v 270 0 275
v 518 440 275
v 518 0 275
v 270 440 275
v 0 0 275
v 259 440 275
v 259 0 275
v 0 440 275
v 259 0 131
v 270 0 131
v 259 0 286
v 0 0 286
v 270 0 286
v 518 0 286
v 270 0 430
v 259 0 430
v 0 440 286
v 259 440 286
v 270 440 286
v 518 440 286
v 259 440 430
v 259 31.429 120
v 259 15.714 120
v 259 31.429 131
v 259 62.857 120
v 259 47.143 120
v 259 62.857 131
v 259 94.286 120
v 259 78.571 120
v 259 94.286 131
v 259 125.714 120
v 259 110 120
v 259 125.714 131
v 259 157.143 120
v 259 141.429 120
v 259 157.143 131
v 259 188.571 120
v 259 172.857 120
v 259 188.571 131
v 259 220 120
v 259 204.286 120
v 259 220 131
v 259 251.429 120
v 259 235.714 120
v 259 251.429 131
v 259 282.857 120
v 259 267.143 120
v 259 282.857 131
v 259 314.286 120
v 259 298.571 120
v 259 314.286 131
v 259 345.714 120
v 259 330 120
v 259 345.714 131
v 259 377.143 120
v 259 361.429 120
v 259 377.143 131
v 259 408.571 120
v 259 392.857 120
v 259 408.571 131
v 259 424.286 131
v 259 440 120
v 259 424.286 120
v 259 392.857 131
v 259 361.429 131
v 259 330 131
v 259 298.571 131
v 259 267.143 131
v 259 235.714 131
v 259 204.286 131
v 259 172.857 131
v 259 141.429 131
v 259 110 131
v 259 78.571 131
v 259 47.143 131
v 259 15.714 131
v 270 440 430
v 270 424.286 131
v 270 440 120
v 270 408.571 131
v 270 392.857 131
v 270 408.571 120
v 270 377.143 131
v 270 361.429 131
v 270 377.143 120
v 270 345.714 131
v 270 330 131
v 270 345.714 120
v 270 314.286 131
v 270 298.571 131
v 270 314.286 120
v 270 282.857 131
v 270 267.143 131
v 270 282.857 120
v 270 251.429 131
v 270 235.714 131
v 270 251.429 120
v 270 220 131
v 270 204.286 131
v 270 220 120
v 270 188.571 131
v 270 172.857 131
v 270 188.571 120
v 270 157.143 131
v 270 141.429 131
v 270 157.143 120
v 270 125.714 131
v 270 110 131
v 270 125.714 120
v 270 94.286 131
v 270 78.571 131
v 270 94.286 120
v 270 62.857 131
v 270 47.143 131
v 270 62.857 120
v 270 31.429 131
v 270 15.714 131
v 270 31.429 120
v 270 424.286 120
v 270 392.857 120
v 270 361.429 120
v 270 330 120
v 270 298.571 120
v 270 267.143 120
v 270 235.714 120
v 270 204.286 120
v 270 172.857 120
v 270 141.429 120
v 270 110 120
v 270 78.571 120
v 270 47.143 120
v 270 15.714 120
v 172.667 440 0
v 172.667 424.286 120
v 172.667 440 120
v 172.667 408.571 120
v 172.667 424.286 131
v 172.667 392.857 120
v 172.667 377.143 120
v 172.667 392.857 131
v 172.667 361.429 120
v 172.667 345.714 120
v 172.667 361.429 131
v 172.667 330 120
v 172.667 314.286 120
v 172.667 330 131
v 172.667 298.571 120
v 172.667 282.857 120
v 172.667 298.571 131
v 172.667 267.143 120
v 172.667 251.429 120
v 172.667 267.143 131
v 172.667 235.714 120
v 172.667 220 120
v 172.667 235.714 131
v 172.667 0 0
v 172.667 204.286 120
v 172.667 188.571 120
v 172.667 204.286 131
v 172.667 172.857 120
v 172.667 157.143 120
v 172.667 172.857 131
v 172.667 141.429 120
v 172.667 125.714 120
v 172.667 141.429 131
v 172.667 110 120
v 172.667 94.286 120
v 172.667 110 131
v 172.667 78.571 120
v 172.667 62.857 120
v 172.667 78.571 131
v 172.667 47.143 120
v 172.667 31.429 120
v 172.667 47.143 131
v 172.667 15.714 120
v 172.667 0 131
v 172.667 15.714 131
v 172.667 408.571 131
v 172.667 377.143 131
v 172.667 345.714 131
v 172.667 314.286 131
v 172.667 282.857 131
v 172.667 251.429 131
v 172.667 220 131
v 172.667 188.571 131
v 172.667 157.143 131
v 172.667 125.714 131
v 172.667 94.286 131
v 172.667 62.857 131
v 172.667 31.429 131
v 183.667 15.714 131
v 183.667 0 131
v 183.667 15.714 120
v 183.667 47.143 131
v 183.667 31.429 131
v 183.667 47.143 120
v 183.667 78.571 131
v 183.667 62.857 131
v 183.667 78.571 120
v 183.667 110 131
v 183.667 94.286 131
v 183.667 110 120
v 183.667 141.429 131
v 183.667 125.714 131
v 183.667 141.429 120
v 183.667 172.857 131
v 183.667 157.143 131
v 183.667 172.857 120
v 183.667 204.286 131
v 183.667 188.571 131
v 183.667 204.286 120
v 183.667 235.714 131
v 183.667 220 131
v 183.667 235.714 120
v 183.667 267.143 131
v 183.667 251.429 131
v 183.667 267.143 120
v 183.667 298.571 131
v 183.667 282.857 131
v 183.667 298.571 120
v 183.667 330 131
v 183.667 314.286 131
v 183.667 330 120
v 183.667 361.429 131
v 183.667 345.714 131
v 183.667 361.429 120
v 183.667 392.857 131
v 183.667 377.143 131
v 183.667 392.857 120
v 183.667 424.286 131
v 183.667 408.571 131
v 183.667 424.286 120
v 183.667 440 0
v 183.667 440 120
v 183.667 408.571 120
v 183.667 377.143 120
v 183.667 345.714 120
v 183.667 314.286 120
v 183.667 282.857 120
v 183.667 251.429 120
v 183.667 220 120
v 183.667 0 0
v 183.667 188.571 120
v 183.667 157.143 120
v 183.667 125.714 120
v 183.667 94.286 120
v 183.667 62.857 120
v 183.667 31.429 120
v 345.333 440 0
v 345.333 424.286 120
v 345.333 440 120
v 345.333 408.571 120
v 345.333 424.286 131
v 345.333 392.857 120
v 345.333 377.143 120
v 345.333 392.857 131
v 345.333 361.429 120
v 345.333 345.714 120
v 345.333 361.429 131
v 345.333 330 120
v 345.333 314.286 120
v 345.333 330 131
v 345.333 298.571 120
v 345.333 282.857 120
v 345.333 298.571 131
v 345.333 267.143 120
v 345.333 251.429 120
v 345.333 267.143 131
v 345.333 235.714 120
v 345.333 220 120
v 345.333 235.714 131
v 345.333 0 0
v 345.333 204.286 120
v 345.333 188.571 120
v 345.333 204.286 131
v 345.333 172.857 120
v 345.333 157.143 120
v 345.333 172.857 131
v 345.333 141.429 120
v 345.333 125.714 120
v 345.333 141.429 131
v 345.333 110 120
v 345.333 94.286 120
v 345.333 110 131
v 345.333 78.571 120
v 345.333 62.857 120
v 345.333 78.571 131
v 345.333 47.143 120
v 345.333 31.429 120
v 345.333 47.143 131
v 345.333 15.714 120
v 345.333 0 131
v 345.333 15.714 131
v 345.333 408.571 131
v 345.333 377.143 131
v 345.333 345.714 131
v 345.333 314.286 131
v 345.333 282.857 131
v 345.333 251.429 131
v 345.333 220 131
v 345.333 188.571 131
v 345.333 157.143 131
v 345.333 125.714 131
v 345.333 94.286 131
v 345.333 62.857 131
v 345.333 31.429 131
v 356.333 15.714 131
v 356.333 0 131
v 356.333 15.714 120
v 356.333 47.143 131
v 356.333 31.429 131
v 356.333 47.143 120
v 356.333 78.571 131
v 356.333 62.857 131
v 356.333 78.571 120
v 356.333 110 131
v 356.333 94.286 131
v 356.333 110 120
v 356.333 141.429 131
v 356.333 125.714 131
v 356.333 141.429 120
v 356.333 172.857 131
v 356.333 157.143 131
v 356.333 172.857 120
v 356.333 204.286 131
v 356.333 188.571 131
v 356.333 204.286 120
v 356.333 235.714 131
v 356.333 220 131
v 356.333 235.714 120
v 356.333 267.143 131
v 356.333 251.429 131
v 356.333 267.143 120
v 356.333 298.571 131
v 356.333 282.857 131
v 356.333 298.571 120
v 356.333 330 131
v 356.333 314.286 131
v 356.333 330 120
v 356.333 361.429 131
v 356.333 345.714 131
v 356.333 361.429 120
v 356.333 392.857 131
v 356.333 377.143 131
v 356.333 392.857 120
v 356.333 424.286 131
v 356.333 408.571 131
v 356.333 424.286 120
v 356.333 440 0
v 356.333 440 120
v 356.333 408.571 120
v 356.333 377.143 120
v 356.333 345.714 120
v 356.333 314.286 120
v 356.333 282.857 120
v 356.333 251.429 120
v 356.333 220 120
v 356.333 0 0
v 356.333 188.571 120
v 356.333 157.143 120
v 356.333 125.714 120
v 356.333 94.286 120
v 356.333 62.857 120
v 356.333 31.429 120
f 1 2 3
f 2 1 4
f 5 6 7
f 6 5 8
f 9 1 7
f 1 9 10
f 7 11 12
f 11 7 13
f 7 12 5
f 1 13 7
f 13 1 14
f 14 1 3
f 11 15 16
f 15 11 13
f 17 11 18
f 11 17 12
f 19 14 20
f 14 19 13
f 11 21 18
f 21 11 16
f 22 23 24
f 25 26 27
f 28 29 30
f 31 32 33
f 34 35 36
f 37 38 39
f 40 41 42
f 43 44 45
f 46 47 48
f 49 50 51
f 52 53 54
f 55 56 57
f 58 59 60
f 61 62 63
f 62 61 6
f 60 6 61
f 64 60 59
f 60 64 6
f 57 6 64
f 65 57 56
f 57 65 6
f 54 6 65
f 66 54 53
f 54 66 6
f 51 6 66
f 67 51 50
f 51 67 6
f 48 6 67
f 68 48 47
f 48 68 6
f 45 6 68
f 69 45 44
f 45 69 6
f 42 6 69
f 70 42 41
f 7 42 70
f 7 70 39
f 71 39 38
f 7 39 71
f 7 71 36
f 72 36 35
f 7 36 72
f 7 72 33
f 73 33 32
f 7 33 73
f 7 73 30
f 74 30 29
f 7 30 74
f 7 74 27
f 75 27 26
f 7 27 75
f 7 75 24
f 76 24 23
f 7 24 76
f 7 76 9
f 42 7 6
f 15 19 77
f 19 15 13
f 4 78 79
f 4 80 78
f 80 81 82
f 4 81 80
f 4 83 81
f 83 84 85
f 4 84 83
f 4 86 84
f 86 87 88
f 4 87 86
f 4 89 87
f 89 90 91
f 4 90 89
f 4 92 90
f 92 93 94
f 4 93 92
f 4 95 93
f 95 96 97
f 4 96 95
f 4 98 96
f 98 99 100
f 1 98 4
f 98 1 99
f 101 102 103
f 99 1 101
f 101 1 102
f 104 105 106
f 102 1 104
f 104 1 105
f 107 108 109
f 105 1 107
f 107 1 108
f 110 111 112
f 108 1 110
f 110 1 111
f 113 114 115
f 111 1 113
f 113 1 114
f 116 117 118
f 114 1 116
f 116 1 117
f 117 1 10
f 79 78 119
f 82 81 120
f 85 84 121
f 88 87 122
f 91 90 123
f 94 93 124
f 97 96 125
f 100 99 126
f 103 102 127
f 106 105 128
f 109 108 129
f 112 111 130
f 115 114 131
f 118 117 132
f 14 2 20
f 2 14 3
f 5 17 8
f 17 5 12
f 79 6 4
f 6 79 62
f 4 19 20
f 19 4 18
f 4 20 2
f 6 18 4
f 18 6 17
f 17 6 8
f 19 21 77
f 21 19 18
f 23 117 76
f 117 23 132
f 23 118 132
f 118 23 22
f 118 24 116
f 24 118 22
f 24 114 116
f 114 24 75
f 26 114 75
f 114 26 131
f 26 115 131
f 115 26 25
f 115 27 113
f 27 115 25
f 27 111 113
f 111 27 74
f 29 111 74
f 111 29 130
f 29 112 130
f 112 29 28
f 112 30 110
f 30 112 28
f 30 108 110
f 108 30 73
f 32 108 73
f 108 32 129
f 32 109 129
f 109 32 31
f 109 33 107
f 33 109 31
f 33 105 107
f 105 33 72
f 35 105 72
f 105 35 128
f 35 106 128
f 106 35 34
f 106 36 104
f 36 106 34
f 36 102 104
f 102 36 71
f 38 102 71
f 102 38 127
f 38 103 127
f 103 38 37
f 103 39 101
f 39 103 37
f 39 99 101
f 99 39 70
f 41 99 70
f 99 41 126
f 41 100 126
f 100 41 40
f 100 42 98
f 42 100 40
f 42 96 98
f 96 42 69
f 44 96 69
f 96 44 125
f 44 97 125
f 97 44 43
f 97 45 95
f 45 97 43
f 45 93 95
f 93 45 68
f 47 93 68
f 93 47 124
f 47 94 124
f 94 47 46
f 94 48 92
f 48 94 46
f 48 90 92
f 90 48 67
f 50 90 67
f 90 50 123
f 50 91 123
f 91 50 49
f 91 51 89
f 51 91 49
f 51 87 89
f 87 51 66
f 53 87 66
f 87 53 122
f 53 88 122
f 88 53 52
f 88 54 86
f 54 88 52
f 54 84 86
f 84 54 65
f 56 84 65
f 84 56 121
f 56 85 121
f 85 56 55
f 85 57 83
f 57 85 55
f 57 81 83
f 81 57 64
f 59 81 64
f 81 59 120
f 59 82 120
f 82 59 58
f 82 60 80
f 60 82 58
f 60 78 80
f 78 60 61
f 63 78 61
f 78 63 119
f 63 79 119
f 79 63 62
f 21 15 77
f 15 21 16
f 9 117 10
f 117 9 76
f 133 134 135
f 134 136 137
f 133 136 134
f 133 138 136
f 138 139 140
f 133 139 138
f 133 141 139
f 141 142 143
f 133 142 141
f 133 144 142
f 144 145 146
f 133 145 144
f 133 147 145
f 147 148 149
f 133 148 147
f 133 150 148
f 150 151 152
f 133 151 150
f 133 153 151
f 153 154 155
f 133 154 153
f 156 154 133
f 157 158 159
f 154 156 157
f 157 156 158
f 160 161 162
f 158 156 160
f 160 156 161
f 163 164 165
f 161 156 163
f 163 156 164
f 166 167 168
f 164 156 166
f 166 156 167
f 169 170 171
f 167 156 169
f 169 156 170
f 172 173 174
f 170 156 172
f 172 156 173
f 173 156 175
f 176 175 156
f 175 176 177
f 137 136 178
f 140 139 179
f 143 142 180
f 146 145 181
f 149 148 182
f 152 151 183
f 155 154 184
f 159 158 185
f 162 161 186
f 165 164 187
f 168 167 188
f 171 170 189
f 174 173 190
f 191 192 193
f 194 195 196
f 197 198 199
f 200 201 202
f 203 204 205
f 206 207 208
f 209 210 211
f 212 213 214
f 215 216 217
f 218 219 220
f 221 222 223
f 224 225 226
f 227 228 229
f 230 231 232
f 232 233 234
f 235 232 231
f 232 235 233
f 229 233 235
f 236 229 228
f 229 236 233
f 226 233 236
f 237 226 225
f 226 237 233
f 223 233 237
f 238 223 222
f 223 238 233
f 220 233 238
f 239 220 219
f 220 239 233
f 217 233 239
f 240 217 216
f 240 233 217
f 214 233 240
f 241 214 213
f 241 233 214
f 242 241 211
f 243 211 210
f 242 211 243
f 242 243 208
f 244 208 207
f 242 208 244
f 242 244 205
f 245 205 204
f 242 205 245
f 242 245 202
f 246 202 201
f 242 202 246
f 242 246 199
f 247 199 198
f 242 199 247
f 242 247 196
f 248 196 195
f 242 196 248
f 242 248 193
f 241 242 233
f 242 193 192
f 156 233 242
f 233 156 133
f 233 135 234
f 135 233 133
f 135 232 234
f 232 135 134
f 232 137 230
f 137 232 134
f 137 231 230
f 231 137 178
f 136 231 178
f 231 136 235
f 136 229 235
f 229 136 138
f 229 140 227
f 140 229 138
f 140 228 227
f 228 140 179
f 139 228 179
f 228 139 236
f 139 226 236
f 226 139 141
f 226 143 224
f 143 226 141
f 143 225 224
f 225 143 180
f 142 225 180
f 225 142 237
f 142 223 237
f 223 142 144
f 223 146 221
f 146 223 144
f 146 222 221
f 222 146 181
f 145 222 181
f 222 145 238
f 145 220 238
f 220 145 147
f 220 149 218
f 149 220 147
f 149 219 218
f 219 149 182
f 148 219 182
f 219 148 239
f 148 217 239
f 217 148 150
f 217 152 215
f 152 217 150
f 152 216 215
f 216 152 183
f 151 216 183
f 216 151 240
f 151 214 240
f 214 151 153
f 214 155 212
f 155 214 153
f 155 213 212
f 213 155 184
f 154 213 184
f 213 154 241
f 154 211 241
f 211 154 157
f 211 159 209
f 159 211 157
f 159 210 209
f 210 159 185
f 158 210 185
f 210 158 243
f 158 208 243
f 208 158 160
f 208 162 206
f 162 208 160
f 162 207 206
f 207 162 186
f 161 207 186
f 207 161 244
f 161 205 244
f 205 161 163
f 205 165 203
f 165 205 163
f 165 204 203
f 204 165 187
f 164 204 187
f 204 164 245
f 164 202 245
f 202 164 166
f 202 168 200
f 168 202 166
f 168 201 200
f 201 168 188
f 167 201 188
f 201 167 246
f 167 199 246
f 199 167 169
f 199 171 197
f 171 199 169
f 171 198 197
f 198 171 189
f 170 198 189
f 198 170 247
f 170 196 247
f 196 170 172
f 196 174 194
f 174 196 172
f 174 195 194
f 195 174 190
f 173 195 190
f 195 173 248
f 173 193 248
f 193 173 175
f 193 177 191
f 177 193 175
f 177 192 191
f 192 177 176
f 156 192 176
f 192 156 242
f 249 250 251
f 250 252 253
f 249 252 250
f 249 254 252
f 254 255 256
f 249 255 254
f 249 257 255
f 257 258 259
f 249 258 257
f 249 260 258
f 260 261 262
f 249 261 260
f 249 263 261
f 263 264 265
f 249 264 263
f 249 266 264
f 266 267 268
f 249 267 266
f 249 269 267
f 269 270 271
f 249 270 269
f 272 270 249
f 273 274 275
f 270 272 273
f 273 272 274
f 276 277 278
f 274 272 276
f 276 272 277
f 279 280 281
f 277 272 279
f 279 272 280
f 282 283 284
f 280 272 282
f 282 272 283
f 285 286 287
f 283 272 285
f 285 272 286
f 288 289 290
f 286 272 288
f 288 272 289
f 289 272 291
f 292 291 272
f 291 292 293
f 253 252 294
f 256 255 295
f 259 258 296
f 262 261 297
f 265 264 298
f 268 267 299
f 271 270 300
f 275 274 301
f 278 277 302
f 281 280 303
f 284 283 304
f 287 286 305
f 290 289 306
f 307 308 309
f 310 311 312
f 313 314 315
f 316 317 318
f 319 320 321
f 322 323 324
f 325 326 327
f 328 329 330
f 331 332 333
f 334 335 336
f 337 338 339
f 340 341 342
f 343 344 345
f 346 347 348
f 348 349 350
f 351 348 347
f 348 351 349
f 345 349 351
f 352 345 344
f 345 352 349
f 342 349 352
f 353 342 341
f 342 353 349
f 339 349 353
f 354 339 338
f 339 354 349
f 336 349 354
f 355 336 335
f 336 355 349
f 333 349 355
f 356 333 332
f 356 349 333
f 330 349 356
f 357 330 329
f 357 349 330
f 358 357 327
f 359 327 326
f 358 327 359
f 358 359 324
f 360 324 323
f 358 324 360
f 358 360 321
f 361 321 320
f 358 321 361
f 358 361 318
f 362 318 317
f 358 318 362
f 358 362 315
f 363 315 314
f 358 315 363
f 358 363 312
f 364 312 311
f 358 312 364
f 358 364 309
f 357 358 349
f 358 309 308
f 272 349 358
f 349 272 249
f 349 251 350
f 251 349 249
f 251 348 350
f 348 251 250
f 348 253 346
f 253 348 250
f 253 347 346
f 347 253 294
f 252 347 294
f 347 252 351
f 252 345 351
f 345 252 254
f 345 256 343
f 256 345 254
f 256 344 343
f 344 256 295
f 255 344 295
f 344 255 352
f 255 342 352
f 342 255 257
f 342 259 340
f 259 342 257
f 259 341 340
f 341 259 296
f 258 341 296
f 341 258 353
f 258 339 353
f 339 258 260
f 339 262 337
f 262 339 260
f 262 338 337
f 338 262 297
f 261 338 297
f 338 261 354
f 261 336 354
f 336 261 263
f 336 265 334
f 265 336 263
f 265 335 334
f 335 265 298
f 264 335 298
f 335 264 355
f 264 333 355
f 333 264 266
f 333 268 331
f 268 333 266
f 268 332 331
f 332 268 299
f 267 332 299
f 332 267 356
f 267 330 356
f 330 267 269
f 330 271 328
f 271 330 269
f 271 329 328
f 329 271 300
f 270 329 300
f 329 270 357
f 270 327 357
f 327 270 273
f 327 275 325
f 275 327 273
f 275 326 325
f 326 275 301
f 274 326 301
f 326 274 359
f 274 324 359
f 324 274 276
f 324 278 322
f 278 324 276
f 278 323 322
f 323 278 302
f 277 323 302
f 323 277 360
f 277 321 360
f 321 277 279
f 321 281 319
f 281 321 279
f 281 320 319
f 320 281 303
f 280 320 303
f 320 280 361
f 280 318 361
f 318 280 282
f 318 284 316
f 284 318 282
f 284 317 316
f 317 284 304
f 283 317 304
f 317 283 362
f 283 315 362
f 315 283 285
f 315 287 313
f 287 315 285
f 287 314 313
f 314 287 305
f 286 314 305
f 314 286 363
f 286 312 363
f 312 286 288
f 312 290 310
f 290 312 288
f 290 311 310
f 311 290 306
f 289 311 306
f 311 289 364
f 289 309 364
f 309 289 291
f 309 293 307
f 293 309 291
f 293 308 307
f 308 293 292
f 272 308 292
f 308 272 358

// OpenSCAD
// file: utils.scad
module nm(){children();}//for debugging
module cut(keep=undef){ //removes overlapping space
	if(is_undef(keep) || keep){
		difference(){
			children(0);
			children([1:$children-1]);
	}}
	if(is_undef(keep) || !keep){
	difference(){
		children([1:$children-1]);
		difference(){
			children(0);
			children([1:$children-1]);
}}}}
	
// file: fingerbox.scad
X = 228; // primary width
Y = 300; // primary length
Z = 88; // primary height
T0 = 8; // primary thickness
fW = 18; // finger width, set to same value as T0 for most predictable results

function div(num, denom) = num / round(num / denom);
function splice(v1, v2)
=	[for (i = [0 : len(v1) + len(v2) - 1]) (i%2) ? v1[i/2] : v2[floor(i/2)]];

function triangleWave(width,height,count, phase=0)
=	[for (i = [0 : count]) [i*width, ((i+phase)%2)*height]]; 
function squareWave(width,height,count)
=	splice(triangleWave(width,height,count),triangleWave(width,height,count,1));

module fingers(width,height,length,swap=false){
	width = div(length,width);
	for(i=[swap ? 0 : width : width*2: length]){
		translate([i,0,0])
		square([width, height]);
}}
module offsetsquare(width, height, offset, offsets=[1,1,1,1]){
	translate(offset*[offsets[2],offsets[0]])
		square(	[width-offset*(offsets[2] + offsets[3]),
			height-offset*(offsets[0] + offsets[1])]
		);
		
}
module fingerplane(width,height,fingerWidth,fingerHeight,sides=[1,1,1,1]){
	difference(){
		square([width, height]);
	union() {
	if (sides[0]) {
		fingers(fingerWidth, fingerHeight, width, true);
	}
	if (sides[1]) {
		translate([0,height-fingerHeight,0])
			fingers(fingerWidth, fingerHeight, width);
	}
	if (sides[3]) {
		mirror([1,0,0])
			rotate([0,0,90])
				fingers(fingerWidth, fingerHeight, height);
	}
	if (sides[2]) {
		translate([width-fingerHeight,0,0])
			mirror([1,0,0])
				rotate([0,0,90])
					fingers(fingerWidth, fingerHeight, height, true);
	}
			
}}}

module ZnPlane(){
	linear_extrude(T0) fingerplane(X,Y,fW,T0);
}
module YnPlane(){	
	rotate([90,0,0]) translate([0,0,-T0]) linear_extrude(T0) fingerplane(X,Z,fW,T0,[0,0,1,1]);
}
module XnPlane(){
	rotate([0,-90,0]) translate([0,0,-T0]) linear_extrude(T0) fingerplane(Z,Y,fW,T0,[0,0,0,0]);
}
module ZpPlane(){
	translate([0,0,Z-T0]) ZnPlane();
}
module YpPlane(){
	translate([0,Y-T0,0]) YnPlane();
}
module XpPlane(){
	translate([X-T0,0,0]) XnPlane();
}

ZnPlane();
YnPlane();
XnPlane();
// main file
use <fingerbox.scad>
use <utils.scad>

keepmode = 0; // 0: both, 1: vertical, 2: horizontal

X = 518; // primary width
Y = 440; // primary length
Z = 430; // primary height
T0 = 11; // primary thickness
fW = 16; // finger width, set to same value as T0 for most predictable results

module scut(){ //hack to circumvent implicit union. should allow vertical and horizontal parts to be rendered seperately
	cut([undef, true, false][keepmode]){
		children(0);
		children([1:$children-1]);
}}

module halfSlot(swap=false, direction=[0,1,0]){
	scale([for (i = direction) 1 - i/2]) intersection(){
		children(0);
		children(1);
}}

module halfSlotted(swap=true, really=true){
	if (really){
		scut(){
		children(swap ? 1:0);
		difference(){
			children(swap ? 0:1);
			halfSlot(){
				children(0);
				children(1);
		}}}
	}else if (keepmode == 0){
		children(0);
		children(1);
	}else {
		children(keepmode - 1);
	
}}

module pillar(bottom=0, top=Z)	{
	fingers = [
		0,
		0,
		bottom == 0 ? 0 : 1,
		top == Z ? 0 : 1
	];
	translate([0,0,top]) rotate([0, 90, 0]) linear_extrude(T0) fingerplane(top - bottom, Y, fW, T0, fingers);
}

module shelf(left=0, right=X)	{
	fingers = [
		0,
		0,
		right == X ? 0 : 1,
		left == 0 ? 0 : 1
	];
	translate([left,0,0]) linear_extrude(T0) fingerplane(right - left, Y, fW, T0, fingers);
}

module grid(u, v, bounds=[Z,0,X,0]){
	height = bounds[0] - bounds[1];
	width = bounds[2] - bounds[3];
		
	halfSlotted(true, v > 1 && u > 1){
		if (u > 1) {for (i = [1:u-1]){
			translate([0, 0, bounds[1] + (height/u) * i]) shelf(bounds[3], bounds[2]);
		}}
		if (v > 1) {for (i = [1:v-1]){
			translate([bounds[3] + (width/v) * i, 0, 0]) pillar(bounds[1], bounds[0]);
		}}
}}

module finalProject(){
	if (keepmode == 0) {children();}
	else if (keepmode == 1) {projection() rotate([90,0,0]) children();}
	else {projection() children();}
}
//grid(3, 3);

grid(2, 2, [Z, 120, X, 0]);
grid(1, 3, [120 + T0, 0, X, 0]);

//grid(1, 3, [Z, 300, X, 0]);
//grid(1, 2, [300 + T0, 0, X, 0]);
//grid(3, 1, [300 + T0, 0, X, X  / 2]);
